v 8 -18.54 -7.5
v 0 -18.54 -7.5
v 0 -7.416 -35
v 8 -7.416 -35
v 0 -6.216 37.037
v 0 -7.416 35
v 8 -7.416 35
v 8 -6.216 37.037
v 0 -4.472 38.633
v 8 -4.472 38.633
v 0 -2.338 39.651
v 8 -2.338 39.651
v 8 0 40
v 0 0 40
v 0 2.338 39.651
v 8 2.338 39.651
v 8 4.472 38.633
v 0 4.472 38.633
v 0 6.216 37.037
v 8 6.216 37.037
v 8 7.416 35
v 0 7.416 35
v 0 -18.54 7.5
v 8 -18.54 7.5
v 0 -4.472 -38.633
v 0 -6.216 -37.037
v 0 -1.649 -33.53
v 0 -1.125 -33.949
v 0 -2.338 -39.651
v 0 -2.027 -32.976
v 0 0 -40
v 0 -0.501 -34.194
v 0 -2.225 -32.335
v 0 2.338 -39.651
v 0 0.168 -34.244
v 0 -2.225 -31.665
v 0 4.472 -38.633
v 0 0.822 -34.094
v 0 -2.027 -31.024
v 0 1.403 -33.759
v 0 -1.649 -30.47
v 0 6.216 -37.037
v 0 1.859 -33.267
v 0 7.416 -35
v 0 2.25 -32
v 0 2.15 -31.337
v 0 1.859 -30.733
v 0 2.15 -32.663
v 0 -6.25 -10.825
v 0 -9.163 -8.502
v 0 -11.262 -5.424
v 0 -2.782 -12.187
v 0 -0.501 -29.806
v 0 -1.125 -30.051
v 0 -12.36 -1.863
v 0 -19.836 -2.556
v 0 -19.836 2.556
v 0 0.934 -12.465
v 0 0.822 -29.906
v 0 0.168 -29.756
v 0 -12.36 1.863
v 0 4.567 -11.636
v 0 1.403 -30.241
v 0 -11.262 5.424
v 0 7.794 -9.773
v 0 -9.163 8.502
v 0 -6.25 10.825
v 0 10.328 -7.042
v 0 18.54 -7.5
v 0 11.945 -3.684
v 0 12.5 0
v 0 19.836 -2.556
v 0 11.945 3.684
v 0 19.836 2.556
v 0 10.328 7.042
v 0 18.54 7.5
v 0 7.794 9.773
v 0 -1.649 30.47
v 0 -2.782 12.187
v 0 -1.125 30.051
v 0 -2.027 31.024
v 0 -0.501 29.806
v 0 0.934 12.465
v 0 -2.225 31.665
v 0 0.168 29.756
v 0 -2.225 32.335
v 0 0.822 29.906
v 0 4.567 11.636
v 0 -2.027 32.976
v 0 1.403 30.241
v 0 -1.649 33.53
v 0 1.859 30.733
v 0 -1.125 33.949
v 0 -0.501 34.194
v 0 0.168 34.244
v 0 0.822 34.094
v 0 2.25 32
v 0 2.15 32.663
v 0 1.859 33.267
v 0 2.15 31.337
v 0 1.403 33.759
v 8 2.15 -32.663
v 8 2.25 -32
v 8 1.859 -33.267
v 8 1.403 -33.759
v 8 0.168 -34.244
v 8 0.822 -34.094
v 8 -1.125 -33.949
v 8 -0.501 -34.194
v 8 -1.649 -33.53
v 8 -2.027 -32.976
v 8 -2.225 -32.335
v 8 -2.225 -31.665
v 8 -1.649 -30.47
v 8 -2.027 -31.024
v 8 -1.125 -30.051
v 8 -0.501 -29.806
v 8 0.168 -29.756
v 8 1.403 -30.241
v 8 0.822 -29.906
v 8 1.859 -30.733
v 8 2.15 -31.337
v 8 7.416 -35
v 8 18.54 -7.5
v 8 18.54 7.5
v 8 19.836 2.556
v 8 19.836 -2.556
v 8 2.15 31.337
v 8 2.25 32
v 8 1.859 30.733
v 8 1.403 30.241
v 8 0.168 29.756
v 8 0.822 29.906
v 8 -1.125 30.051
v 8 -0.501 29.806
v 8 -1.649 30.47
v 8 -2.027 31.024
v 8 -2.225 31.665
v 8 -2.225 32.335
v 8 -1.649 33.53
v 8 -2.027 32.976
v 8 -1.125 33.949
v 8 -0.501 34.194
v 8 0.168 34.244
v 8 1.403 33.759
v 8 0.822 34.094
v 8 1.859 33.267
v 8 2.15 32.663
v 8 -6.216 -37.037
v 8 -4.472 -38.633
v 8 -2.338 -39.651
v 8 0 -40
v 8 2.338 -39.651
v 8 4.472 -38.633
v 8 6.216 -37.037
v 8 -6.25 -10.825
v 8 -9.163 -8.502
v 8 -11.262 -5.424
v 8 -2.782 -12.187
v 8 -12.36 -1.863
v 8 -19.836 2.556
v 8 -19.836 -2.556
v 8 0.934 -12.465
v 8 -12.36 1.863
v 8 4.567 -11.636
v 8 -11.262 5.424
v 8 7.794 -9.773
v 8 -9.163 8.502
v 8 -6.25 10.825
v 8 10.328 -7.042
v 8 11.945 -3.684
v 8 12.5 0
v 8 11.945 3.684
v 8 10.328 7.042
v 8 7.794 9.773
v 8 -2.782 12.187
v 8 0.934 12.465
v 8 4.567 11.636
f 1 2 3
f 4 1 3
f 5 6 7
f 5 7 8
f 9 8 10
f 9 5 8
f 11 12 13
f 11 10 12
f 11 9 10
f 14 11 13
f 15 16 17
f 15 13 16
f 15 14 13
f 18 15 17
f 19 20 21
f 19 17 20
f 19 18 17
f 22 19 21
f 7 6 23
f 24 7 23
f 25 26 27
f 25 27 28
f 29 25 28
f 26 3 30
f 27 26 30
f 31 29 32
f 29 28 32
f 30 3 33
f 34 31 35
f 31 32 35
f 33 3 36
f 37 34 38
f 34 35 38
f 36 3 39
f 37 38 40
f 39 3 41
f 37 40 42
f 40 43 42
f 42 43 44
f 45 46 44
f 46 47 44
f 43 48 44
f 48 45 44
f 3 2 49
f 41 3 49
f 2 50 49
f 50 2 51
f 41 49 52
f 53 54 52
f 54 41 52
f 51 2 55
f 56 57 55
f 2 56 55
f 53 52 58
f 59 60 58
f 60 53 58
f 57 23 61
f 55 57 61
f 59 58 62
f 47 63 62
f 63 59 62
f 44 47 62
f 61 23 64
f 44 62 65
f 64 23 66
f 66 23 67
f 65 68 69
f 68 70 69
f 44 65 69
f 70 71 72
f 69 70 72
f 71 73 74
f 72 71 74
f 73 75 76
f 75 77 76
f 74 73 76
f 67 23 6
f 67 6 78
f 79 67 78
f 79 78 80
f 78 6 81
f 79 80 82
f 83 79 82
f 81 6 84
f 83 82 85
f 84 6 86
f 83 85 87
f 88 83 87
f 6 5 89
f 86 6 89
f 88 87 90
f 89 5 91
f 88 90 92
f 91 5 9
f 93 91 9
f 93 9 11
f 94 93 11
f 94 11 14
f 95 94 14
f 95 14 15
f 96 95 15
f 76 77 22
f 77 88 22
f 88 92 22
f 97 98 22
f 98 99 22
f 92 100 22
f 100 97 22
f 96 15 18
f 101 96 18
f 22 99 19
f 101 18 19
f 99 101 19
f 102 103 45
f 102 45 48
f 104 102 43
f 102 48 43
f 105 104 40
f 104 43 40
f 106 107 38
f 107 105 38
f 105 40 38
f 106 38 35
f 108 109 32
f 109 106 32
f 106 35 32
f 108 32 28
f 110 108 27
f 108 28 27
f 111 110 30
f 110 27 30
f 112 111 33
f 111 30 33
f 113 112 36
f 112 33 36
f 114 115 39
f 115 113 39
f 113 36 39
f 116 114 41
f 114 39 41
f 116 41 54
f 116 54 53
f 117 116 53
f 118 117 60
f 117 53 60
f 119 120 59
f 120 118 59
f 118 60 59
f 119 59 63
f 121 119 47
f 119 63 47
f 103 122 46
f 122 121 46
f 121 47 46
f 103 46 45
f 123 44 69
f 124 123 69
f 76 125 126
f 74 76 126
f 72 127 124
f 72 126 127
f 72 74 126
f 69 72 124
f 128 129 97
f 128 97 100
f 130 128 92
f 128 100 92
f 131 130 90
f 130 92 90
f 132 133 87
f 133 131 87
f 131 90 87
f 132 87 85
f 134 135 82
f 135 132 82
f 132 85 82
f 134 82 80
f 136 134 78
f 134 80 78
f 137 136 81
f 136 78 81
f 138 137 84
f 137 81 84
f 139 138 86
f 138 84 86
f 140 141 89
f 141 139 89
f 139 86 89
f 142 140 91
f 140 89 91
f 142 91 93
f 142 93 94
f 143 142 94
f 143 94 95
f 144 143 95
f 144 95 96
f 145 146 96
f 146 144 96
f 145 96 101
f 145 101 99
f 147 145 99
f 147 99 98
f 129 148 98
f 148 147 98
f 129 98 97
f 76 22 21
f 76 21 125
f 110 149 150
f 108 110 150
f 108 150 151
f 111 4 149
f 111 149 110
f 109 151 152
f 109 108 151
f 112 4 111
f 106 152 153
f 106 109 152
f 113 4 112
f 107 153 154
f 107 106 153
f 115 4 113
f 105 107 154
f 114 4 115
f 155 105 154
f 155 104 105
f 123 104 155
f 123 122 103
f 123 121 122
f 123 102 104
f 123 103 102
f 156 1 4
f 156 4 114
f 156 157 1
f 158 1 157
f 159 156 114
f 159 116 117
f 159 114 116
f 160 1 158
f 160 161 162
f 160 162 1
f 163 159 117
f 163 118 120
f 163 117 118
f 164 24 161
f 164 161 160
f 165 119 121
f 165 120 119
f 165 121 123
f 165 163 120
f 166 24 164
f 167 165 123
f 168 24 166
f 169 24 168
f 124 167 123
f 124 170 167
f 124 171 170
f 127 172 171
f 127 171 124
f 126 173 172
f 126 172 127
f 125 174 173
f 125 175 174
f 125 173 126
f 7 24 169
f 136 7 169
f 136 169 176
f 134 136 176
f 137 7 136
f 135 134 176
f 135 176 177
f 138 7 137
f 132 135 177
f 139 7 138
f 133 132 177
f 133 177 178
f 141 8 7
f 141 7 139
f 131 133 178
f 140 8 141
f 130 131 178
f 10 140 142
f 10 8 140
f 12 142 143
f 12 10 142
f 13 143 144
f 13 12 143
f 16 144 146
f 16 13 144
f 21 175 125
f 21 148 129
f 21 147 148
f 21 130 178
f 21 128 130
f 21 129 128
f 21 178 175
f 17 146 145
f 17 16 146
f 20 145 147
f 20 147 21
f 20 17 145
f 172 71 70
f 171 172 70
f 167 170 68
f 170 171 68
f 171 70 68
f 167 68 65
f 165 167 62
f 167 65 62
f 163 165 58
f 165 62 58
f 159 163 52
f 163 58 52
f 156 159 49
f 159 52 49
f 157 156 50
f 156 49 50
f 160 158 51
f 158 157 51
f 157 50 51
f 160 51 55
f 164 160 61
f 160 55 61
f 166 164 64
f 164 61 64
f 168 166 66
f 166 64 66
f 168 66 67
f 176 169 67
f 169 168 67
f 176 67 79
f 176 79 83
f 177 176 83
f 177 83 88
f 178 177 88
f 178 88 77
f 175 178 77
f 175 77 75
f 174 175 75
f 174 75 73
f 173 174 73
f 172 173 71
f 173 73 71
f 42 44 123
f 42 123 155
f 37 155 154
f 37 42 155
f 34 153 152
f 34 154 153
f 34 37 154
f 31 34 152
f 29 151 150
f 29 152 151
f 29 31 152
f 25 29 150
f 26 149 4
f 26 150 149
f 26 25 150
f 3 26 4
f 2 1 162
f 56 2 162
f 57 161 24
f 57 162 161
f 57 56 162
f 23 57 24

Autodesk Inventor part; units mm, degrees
ref_plane "YZ Plane" through (0, 0, 0) normal (1, 0, 0) x (0, 1, 0)
ref_plane "XZ Plane" through (0, 0, 0) normal (0, 1, 0) x (-1, 0, 0)
ref_plane "XY Plane" through (0, 0, 0) normal (0, 0, 1) x (1, 0, 0)
sketch "Sketch4" plane through (0, 0, 0) normal (1, 0, 0) x (0, 1, 0)
  circle A0 centre (0, 0) radius 12.5
  arc A1 (-7.4162, -35) -> (7.4162, -35) centre (0, -32) ccw
  arc A2 (7.4162, 35) -> (-7.4162, 35) centre (0, 32) ccw
  line L0 (7.4162, 35) -> (18.5405, 7.5)
  line L1 (-7.4162, 35) -> (-18.5405, 7.5)
  line L2 (-18.5405, -7.5) -> (-7.4162, -35)
  line L3 (7.4162, -35) -> (18.5405, -7.5)
  arc A3 (-18.5405, 7.5) -> (-18.5405, -7.5) centre (0, 0) ccw
  arc A4 (18.5405, -7.5) -> (18.5405, 7.5) centre (0, 0) ccw
  circle A5 centre (0, 32) radius 2.25
  circle A6 centre (0, -32) radius 2.25
  line L4 (0, 32) -> (0, 0) construction
  line L5 (0, 0) -> (0, -32) construction
  dimension "d32" = 4.5
  dimension "d33" = 4.5
  dimension "d34" = 25
  dimension "d35" = 8
  dimension "d36" = 64
  dimension "d37" = 20
extrude "Extrusion2" add sketch "Sketch4" along normal blind 8
properties part number "M14 - Upper Bearing Support" material "Polycarbonate, Clear"
